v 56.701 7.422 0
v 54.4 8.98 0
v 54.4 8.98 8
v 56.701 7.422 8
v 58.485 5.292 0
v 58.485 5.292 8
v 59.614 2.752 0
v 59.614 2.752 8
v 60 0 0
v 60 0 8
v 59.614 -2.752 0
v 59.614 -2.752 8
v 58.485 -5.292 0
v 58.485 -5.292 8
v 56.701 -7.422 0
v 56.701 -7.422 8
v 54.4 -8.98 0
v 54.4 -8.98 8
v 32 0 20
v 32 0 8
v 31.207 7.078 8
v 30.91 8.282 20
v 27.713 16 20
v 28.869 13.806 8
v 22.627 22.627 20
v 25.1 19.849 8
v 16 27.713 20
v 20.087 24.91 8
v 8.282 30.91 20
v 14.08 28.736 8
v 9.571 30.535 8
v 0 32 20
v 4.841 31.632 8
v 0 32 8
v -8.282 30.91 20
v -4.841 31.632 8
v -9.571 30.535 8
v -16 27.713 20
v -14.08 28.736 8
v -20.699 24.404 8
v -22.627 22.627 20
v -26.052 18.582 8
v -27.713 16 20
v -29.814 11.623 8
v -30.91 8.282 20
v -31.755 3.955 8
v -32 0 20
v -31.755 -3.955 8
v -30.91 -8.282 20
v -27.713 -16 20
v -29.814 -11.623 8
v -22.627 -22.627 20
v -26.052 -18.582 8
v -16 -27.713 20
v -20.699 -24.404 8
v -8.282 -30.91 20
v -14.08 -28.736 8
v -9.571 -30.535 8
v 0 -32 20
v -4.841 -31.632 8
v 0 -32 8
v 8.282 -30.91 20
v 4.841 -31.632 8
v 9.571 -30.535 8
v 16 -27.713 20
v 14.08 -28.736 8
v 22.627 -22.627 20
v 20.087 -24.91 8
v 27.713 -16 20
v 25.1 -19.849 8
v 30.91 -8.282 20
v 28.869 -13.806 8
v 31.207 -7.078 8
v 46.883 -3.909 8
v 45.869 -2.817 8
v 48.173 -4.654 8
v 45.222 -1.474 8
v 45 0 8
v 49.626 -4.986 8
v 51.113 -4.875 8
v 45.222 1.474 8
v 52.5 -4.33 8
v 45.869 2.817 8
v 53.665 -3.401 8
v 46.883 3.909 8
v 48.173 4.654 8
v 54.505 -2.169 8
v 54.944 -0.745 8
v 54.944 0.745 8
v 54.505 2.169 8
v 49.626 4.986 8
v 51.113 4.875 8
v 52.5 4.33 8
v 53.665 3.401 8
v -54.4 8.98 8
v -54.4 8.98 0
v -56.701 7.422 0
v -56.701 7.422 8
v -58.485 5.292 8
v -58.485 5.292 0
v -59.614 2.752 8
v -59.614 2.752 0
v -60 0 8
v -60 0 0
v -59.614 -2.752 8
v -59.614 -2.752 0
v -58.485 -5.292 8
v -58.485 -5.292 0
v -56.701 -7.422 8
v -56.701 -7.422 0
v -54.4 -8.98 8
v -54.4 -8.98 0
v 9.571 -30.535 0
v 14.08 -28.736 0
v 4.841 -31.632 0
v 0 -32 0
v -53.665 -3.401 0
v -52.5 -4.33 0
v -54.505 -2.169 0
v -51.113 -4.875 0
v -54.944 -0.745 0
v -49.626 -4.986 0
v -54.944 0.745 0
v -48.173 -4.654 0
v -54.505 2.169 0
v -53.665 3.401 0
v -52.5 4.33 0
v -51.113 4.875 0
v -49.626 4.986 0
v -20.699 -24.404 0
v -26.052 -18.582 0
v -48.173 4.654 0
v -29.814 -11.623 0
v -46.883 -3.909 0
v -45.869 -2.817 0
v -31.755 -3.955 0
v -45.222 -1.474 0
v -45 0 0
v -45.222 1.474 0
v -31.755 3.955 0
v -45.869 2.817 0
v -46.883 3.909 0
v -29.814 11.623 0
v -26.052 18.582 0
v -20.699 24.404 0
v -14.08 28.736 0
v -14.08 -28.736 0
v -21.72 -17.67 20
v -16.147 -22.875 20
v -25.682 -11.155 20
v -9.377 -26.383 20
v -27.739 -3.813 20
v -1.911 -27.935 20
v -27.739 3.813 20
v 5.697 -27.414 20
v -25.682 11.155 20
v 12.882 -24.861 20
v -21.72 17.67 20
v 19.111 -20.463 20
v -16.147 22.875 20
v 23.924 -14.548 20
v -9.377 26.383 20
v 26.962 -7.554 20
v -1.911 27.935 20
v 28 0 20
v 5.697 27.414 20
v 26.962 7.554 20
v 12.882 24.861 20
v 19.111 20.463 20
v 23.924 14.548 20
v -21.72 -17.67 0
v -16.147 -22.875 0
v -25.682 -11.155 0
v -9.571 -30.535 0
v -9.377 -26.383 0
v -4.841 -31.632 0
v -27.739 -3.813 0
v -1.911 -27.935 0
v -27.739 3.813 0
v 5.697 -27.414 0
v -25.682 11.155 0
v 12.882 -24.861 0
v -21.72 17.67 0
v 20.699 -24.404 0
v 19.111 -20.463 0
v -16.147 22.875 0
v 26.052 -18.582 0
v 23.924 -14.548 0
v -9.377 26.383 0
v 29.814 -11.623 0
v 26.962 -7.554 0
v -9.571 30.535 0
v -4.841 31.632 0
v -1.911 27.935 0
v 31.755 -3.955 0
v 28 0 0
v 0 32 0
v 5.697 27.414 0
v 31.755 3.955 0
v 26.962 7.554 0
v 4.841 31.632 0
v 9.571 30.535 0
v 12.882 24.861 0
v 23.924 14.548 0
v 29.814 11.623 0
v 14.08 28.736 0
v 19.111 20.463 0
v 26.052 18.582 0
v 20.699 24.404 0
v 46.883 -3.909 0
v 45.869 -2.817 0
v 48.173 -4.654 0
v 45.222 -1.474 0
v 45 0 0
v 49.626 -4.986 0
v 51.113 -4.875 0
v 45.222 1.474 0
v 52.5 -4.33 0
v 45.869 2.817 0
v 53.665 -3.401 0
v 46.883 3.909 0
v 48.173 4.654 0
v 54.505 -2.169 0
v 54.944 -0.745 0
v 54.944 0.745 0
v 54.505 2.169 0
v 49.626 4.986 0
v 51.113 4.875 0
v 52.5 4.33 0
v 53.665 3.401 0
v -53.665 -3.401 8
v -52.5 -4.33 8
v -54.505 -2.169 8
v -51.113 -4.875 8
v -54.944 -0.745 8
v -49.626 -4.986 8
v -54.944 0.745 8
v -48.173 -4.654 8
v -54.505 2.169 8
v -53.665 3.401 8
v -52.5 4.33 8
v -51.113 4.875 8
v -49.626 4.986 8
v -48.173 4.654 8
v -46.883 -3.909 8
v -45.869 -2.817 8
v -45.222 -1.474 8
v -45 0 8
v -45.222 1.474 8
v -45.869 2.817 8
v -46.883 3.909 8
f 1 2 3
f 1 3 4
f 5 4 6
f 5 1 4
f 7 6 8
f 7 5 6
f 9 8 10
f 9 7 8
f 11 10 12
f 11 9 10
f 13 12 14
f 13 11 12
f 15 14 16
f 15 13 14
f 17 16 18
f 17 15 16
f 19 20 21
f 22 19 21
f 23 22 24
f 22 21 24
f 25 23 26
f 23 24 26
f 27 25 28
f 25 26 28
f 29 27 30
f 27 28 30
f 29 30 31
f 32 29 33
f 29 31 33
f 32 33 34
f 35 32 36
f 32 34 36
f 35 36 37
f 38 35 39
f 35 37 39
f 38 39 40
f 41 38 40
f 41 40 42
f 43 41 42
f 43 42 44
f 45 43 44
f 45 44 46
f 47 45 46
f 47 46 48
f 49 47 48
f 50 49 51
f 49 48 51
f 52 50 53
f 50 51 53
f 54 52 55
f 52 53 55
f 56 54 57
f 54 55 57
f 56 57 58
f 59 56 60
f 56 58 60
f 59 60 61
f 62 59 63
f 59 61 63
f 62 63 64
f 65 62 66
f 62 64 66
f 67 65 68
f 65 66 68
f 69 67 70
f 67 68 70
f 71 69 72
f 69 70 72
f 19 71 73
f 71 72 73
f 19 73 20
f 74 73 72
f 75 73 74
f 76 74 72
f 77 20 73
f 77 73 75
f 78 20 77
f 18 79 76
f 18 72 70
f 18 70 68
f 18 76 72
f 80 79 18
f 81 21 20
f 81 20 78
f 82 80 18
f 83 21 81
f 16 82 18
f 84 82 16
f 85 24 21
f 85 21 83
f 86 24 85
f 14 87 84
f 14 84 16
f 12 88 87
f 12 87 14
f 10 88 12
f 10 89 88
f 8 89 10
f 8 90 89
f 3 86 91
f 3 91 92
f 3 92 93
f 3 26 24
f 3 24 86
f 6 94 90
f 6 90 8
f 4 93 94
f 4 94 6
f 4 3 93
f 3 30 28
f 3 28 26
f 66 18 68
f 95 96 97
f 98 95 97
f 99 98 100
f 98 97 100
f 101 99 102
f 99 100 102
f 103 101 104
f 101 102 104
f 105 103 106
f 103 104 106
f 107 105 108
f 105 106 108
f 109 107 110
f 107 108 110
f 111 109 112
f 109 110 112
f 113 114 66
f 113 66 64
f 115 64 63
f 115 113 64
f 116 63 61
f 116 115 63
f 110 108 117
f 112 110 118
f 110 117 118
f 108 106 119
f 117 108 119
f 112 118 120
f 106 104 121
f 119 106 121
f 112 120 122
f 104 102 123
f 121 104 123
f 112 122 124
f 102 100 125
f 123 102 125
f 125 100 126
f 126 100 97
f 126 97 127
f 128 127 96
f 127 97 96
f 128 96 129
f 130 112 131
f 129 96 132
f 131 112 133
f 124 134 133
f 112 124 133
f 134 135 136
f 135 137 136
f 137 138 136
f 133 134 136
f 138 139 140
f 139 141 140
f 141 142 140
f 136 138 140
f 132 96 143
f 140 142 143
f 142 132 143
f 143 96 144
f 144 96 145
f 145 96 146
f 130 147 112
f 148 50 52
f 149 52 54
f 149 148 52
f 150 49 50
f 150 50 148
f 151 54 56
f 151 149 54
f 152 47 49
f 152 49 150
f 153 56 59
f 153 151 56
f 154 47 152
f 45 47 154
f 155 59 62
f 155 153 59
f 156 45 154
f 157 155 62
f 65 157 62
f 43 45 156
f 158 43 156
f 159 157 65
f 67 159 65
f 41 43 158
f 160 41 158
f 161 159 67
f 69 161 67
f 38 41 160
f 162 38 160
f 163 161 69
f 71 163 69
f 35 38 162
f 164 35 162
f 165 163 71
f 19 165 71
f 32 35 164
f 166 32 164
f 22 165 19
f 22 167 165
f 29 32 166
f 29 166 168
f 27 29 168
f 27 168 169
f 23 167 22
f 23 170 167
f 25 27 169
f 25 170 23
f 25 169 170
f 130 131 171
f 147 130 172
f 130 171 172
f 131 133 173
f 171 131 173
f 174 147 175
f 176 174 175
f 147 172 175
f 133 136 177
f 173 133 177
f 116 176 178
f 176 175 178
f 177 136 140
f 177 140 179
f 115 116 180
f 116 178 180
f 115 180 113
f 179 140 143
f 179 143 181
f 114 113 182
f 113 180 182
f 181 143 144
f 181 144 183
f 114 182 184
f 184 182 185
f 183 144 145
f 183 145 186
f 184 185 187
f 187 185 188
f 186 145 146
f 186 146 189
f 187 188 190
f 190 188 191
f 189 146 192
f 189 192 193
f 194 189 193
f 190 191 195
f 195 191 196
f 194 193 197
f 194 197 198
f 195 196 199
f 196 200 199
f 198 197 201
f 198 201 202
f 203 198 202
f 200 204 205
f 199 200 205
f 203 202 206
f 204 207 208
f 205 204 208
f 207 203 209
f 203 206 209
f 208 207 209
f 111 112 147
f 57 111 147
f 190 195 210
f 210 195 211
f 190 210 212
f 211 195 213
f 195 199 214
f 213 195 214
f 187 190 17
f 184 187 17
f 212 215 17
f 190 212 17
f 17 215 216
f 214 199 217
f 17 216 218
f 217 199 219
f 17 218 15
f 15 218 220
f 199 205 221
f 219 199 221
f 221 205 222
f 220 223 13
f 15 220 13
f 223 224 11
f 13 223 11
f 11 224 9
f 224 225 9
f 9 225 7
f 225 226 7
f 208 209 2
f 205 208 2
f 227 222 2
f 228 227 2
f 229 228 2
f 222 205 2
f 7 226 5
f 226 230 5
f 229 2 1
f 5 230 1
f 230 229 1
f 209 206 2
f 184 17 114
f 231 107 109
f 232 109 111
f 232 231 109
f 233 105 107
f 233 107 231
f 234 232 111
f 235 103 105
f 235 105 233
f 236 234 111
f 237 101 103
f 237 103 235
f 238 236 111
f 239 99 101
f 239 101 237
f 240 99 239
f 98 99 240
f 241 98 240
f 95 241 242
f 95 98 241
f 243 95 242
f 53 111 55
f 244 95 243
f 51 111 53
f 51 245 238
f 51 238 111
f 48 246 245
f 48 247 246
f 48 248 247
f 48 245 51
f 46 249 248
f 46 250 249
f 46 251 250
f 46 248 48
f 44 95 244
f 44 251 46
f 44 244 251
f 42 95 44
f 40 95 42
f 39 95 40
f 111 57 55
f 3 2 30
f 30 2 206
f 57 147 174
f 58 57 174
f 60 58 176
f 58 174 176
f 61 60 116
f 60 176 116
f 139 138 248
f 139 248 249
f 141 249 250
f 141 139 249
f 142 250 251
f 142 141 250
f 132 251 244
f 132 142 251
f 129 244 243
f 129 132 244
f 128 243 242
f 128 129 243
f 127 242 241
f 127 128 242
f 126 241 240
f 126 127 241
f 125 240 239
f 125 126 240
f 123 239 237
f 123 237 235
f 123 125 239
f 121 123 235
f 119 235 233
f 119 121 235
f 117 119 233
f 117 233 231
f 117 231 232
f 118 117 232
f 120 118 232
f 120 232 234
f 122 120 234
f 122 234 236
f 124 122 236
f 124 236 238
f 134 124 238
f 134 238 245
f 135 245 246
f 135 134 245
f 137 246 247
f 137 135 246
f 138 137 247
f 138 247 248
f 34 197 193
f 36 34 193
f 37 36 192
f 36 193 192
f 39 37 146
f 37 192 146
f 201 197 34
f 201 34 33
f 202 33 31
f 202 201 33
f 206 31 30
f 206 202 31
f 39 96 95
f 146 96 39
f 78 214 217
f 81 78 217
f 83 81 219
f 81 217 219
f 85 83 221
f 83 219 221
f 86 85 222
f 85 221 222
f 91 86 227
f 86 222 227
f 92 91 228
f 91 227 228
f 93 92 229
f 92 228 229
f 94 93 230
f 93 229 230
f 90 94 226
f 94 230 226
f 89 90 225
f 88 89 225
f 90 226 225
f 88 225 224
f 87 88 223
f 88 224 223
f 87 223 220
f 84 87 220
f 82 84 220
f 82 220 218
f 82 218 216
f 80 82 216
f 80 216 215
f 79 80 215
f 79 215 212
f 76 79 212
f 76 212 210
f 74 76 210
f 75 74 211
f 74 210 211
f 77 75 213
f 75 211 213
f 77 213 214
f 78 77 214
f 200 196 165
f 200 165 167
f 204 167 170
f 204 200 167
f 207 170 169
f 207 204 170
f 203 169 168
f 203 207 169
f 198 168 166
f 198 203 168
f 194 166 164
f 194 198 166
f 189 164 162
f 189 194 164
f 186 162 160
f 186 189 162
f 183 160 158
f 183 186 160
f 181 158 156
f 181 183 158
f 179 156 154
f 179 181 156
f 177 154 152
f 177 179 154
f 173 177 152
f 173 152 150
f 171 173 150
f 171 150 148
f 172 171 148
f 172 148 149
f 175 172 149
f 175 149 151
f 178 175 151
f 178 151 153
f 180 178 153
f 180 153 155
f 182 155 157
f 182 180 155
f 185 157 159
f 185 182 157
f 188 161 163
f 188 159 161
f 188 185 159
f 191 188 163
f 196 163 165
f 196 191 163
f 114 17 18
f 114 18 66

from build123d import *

# Parameters (mm, degrees)
SKETCH_R     = 5
PAD_DEPTH    = 8
SKETCH001_R  = 32
PAD001_DEPTH = 20
SKETCH002_R  = 28
POCKET_DEPTH = 20.0010001


with BuildPart() as part:
    # Sketch → Pad (new body)
    with BuildSketch(Plane.XY):
        with BuildLine():
            Line((-54.4, 8.9799777283), (-14.08, 28.7359287304))
            ThreePointArc((0, 32), (-7.2266963623, 31.1733036377), (-14.08, 28.7359287304))
            Line((0, -32), (0, 32))
            ThreePointArc((-14.08, -28.7359287304), (-7.2266963623, -31.1733036377), (0, -32))
            Line((-54.4, -8.9799777283), (-14.08, -28.7359287304))
            ThreePointArc((-54.4, 8.9799777283), (-60, 0), (-54.4, -8.9799777283))
        make_face()
        with Locations((-50, 0)):
            Circle(SKETCH_R, mode=Mode.SUBTRACT)
    pad = extrude(amount=PAD_DEPTH)

    # Mirrored: Pad across Sketch V_Axis
    add(pad.mirror(Plane(origin=(0, 0, 0), x_dir=(0, 0, 1), z_dir=(1, 0, 0))))

    # Sketch001 → Pad001 (join)
    with BuildSketch(Plane.XY):
        Circle(SKETCH001_R)
    extrude(amount=PAD001_DEPTH)

    # Sketch002 → Pocket (cut, through all)
    with BuildSketch(Plane.XY):
        Circle(SKETCH002_R)
    extrude(amount=POCKET_DEPTH, mode=Mode.SUBTRACT)


solid = part.part
